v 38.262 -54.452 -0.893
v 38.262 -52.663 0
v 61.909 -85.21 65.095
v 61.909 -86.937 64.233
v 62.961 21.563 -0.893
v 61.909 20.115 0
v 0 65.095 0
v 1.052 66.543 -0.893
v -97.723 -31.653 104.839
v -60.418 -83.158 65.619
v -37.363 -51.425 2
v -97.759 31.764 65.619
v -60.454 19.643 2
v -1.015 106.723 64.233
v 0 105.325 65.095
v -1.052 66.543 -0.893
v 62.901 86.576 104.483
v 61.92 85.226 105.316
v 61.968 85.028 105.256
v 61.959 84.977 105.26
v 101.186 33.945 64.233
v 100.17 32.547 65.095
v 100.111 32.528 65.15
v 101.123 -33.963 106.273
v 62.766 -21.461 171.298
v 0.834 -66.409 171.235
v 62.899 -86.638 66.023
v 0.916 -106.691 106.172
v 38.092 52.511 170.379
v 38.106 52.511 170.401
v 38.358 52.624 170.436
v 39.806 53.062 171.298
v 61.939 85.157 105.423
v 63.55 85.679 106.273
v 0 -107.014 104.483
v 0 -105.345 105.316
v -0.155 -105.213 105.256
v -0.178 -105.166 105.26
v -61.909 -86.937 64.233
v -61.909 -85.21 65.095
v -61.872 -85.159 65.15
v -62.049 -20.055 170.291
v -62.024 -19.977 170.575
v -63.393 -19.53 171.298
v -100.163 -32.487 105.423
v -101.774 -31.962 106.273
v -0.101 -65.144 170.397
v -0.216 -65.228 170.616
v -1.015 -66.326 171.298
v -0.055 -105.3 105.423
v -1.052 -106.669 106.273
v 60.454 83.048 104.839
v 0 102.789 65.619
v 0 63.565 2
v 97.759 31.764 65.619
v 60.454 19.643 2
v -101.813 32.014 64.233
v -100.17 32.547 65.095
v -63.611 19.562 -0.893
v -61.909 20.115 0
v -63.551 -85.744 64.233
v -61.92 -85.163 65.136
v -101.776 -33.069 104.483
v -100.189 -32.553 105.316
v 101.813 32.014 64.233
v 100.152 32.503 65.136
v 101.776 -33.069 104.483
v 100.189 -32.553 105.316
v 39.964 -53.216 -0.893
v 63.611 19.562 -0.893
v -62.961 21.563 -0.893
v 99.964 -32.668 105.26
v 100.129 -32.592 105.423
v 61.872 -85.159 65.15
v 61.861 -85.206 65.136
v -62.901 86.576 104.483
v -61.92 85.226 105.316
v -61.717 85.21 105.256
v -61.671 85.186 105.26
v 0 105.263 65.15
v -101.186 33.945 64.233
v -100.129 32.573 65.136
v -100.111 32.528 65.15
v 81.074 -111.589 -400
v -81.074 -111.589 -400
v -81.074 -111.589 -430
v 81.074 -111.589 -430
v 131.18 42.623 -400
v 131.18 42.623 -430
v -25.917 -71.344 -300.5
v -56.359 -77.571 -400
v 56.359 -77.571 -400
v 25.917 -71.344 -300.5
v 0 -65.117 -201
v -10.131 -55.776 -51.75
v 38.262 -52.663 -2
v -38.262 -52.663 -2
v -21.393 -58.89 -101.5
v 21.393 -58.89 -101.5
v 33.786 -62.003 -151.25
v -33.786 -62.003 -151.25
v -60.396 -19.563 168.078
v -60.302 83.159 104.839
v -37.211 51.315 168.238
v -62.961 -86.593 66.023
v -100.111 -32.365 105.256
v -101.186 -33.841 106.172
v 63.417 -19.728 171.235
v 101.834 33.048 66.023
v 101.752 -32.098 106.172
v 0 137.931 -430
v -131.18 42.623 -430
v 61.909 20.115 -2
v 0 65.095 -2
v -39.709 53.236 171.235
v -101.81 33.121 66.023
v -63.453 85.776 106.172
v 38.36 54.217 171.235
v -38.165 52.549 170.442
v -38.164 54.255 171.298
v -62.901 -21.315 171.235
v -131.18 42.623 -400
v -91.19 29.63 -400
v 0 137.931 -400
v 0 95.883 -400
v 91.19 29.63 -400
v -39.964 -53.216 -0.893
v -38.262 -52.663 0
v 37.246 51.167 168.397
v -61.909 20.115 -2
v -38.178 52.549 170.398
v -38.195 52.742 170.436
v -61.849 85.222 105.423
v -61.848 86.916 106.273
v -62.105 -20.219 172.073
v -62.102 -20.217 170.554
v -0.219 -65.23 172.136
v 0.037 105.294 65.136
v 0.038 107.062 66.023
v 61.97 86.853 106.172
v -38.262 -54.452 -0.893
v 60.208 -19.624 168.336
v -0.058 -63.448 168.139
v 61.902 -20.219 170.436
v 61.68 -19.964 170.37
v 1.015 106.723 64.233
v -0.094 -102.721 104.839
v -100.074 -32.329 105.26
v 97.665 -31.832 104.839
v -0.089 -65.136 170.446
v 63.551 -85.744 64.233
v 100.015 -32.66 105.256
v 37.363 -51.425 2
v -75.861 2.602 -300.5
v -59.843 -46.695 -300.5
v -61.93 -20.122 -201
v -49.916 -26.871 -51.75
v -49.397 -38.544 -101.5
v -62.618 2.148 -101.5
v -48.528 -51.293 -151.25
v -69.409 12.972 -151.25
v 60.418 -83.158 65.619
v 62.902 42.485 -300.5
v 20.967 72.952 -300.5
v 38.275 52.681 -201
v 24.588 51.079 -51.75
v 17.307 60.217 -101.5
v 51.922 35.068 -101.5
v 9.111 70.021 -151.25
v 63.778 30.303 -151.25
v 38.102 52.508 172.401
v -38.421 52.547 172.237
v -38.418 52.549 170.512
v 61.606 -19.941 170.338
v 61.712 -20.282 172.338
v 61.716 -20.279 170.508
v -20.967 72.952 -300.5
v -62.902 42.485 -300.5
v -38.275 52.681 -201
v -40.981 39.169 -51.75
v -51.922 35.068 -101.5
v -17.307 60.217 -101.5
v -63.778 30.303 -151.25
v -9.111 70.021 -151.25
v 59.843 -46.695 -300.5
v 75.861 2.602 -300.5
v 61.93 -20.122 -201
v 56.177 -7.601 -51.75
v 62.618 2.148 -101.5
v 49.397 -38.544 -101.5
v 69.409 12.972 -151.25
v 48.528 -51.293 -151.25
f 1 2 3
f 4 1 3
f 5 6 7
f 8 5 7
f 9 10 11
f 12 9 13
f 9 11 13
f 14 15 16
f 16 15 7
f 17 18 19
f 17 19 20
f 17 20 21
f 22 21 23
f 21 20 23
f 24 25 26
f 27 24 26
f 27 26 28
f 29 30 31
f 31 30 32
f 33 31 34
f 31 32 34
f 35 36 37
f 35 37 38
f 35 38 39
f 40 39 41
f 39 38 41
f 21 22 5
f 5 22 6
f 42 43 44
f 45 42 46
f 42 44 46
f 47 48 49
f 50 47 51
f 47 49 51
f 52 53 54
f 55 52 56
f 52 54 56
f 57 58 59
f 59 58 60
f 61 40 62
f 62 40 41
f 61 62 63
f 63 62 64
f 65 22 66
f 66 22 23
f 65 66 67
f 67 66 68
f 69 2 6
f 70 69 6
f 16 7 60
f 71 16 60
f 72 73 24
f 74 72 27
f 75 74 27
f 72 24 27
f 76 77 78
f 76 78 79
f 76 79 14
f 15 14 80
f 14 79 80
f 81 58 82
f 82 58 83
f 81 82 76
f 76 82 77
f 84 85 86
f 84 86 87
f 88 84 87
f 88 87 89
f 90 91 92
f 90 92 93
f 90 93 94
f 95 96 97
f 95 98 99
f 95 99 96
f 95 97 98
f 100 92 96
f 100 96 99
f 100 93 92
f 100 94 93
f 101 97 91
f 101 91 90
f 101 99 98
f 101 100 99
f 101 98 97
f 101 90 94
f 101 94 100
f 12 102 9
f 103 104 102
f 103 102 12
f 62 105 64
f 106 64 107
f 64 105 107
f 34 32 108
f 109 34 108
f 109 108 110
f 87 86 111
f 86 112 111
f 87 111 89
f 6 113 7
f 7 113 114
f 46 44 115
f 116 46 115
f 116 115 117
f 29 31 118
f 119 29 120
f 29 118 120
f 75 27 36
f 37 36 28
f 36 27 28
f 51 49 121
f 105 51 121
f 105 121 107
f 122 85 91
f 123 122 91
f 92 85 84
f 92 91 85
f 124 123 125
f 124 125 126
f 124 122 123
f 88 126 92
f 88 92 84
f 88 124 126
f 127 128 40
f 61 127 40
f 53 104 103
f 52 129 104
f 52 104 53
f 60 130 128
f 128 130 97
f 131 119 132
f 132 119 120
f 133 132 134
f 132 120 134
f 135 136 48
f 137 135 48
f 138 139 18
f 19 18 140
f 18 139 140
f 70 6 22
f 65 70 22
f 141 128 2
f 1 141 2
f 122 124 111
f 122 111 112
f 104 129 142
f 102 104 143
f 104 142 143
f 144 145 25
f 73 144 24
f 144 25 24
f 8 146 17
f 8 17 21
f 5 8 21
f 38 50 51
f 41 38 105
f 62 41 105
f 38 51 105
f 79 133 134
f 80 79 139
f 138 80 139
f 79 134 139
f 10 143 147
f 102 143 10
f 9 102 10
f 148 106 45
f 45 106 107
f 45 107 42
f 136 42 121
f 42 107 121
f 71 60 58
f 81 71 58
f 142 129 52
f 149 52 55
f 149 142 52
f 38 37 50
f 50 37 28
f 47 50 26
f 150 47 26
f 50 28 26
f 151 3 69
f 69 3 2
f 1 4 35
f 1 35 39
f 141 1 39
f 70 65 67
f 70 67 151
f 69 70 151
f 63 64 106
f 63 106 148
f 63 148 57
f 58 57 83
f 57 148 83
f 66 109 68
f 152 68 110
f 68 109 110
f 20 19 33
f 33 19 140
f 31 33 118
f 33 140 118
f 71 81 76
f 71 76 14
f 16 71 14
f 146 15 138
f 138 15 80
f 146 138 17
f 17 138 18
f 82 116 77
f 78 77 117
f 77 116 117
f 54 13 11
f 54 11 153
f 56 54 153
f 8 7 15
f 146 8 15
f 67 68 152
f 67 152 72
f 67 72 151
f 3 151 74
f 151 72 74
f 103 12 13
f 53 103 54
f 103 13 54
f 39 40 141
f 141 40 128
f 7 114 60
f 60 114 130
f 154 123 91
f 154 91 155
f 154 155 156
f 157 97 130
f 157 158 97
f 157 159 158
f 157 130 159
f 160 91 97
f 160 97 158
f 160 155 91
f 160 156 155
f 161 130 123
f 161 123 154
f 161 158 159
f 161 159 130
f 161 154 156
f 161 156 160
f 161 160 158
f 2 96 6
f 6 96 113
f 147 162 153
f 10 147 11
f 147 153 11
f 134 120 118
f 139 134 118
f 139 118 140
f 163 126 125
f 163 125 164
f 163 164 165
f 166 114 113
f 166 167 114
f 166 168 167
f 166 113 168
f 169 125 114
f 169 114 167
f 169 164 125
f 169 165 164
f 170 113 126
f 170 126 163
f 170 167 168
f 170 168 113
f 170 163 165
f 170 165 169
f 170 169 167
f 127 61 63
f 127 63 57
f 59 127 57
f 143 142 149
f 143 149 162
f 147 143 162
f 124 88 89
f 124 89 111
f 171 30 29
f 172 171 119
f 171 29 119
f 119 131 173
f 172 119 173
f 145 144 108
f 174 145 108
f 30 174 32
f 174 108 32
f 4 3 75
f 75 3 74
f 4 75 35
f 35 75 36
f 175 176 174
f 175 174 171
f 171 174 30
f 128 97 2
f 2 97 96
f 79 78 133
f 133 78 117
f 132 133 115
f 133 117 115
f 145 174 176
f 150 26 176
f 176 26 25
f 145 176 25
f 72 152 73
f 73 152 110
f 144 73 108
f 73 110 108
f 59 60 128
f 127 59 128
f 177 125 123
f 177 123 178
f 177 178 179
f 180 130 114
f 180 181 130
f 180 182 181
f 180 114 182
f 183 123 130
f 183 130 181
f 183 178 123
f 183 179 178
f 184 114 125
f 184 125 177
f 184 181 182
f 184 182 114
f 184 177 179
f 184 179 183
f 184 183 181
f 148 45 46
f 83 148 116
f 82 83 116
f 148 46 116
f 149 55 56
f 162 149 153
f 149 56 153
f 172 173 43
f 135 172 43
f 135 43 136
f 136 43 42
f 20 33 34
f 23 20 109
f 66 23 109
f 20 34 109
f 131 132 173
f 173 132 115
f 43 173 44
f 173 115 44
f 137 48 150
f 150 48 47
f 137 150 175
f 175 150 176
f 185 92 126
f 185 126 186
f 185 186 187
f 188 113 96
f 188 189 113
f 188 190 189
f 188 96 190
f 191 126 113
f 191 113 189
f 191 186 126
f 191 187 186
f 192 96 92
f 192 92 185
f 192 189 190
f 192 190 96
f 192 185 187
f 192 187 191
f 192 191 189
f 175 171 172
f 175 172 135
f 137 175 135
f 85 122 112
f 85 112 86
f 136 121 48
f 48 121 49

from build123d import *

# Parameters (mm, degrees)
F1_DEPTH      = 2
F1_DEPTH_BACK = 2
F4_ANGLE      = -116.51
F5_COUNT      = 5
F8_ANGLE      = -116.51
F9_COUNT      = 5
F14_ANGLE     = -116.51
F20_DEPTH     = 30


with BuildPart() as f1:
    # F0 (on Top) → F1 (new body, two sides)
    with BuildSketch(Plane.XY) as f1_sk:
        Polygon((38.2616896409, -52.6626978685), (61.9087143061, 20.1153606465), (0, 65.094674444), (-61.9087143061, 20.1153606465), (-38.2616896409, -52.6626978685), align=None)
    extrude(amount=-F1_DEPTH)
    extrude(f1_sk.sketch, amount=F1_DEPTH_BACK)


with BuildPart() as f3_1:
    # F3: copy of F1
    add(f1.part)


with BuildPart() as f3_1_1:
    # F4: moved
    add(f3_1.part.rotate(Axis((30.954357153, 42.6050175452, 0), (0.8090169944, -0.5877852523, 0)), F4_ANGLE))


with BuildPart() as f5_1:
    # F5: instance of F3_1
    add(f3_1_1.part.rotate(Axis((0, 0, 53.0848614872), (0, 0, 1)), 1 * 360 / F5_COUNT))


with BuildPart() as f5_2:
    # F5: instance of F3_1
    add(f3_1_1.part.rotate(Axis((0, 0, 53.0848614872), (0, 0, 1)), 2 * 360 / F5_COUNT))


with BuildPart() as f5_3:
    # F5: instance of F3_1
    add(f3_1_1.part.rotate(Axis((0, 0, 53.0848614872), (0, 0, 1)), 3 * 360 / F5_COUNT))


with BuildPart() as f5_4:
    # F5: instance of F3_1
    add(f3_1_1.part.rotate(Axis((0, 0, 53.0848614872), (0, 0, 1)), 4 * 360 / F5_COUNT))


with BuildPart() as f7_1:
    # F7: copy of F3_1
    add(f3_1_1.part)


with BuildPart() as f7_1_1:
    # F8: moved
    add(f7_1.part.rotate(Axis((80.9914244955, 58.8124345203, 85.250931688), (0.5002969823, -0.6877821992, -0.525983437)), F8_ANGLE))


with BuildPart() as f9_1:
    # F9: instance of F7_1
    add(f7_1_1.part.rotate(Axis((0, 0, 53.0848614872), (0, 0, 1)), 1 * 360 / F9_COUNT))


with BuildPart() as f9_2:
    # F9: instance of F7_1
    add(f7_1_1.part.rotate(Axis((0, 0, 53.0848614872), (0, 0, 1)), 2 * 360 / F9_COUNT))


with BuildPart() as f9_3:
    # F9: instance of F7_1
    add(f7_1_1.part.rotate(Axis((0, 0, 53.0848614872), (0, 0, 1)), 3 * 360 / F9_COUNT))


with BuildPart() as f9_4:
    # F9: instance of F7_1
    add(f7_1_1.part.rotate(Axis((0, 0, 53.0848614872), (0, 0, 1)), 4 * 360 / F9_COUNT))


with BuildPart() as f11_1:
    # F11: copy of F9_4
    add(f9_4.part)


with BuildPart() as f12_1:
    # F12: copy of F7_1
    add(f7_1_1.part)


with BuildPart() as f12_1_1:
    # F14: moved
    add(f12_1.part.rotate(Axis((49.7991616985, 16.4611398873, 170.3695933153), (0.3085369287, -0.9512120135, -0.0008179145)), F14_ANGLE))


with BuildPart() as f1_1:
    add(f1.part)

    # F15 (on face) → F18 section 0
    with BuildSketch(Plane(origin=(0, 0, -2), x_dir=(1, 0, 0), z_dir=(0, 0, -1))):
        Polygon((61.9087143061, -20.1153606465), (38.2616896409, 52.6626978685), (-38.2616896409, 52.6626978685), (-61.9087143061, -20.1153606465), (0, -65.094674444), align=None)
    # F17 (on offset) → F18 section 1
    with BuildSketch(Plane.XY.offset(-400)):
        Polygon((-56.358693348, -77.5710865855), (56.358693348, -77.5710865855), (91.1902813985, 29.6295185314), (0, 95.8831361082), (-91.1902813985, 29.6295185314), align=None)
    loft()

    add(f3_1_1.part)  # F20 merges F3_1

    add(f5_1.part)  # F20 merges F5_1

    add(f5_2.part)  # F20 merges F5_2

    add(f5_3.part)  # F20 merges F5_3

    add(f5_4.part)  # F20 merges F5_4

    add(f7_1_1.part)  # F20 merges F7_1

    add(f9_1.part)  # F20 merges F9_1

    add(f9_2.part)  # F20 merges F9_2

    add(f9_3.part)  # F20 merges F9_3

    add(f9_4.part)  # F20 merges F9_4

    add(f12_1_1.part)  # F20 merges F12_1
    # F19 (on offset) → F20 (join)
    with BuildSketch(Plane.XY.offset(-400)):
        Polygon((-81.073921122, -111.5886792541), (81.073921122, -111.5886792541), (131.1803599767, 42.6230827153), (0, 137.9311930774), (-131.1803599767, 42.6230827153), align=None)
    extrude(amount=-F20_DEPTH)


solid = f1_1.part
